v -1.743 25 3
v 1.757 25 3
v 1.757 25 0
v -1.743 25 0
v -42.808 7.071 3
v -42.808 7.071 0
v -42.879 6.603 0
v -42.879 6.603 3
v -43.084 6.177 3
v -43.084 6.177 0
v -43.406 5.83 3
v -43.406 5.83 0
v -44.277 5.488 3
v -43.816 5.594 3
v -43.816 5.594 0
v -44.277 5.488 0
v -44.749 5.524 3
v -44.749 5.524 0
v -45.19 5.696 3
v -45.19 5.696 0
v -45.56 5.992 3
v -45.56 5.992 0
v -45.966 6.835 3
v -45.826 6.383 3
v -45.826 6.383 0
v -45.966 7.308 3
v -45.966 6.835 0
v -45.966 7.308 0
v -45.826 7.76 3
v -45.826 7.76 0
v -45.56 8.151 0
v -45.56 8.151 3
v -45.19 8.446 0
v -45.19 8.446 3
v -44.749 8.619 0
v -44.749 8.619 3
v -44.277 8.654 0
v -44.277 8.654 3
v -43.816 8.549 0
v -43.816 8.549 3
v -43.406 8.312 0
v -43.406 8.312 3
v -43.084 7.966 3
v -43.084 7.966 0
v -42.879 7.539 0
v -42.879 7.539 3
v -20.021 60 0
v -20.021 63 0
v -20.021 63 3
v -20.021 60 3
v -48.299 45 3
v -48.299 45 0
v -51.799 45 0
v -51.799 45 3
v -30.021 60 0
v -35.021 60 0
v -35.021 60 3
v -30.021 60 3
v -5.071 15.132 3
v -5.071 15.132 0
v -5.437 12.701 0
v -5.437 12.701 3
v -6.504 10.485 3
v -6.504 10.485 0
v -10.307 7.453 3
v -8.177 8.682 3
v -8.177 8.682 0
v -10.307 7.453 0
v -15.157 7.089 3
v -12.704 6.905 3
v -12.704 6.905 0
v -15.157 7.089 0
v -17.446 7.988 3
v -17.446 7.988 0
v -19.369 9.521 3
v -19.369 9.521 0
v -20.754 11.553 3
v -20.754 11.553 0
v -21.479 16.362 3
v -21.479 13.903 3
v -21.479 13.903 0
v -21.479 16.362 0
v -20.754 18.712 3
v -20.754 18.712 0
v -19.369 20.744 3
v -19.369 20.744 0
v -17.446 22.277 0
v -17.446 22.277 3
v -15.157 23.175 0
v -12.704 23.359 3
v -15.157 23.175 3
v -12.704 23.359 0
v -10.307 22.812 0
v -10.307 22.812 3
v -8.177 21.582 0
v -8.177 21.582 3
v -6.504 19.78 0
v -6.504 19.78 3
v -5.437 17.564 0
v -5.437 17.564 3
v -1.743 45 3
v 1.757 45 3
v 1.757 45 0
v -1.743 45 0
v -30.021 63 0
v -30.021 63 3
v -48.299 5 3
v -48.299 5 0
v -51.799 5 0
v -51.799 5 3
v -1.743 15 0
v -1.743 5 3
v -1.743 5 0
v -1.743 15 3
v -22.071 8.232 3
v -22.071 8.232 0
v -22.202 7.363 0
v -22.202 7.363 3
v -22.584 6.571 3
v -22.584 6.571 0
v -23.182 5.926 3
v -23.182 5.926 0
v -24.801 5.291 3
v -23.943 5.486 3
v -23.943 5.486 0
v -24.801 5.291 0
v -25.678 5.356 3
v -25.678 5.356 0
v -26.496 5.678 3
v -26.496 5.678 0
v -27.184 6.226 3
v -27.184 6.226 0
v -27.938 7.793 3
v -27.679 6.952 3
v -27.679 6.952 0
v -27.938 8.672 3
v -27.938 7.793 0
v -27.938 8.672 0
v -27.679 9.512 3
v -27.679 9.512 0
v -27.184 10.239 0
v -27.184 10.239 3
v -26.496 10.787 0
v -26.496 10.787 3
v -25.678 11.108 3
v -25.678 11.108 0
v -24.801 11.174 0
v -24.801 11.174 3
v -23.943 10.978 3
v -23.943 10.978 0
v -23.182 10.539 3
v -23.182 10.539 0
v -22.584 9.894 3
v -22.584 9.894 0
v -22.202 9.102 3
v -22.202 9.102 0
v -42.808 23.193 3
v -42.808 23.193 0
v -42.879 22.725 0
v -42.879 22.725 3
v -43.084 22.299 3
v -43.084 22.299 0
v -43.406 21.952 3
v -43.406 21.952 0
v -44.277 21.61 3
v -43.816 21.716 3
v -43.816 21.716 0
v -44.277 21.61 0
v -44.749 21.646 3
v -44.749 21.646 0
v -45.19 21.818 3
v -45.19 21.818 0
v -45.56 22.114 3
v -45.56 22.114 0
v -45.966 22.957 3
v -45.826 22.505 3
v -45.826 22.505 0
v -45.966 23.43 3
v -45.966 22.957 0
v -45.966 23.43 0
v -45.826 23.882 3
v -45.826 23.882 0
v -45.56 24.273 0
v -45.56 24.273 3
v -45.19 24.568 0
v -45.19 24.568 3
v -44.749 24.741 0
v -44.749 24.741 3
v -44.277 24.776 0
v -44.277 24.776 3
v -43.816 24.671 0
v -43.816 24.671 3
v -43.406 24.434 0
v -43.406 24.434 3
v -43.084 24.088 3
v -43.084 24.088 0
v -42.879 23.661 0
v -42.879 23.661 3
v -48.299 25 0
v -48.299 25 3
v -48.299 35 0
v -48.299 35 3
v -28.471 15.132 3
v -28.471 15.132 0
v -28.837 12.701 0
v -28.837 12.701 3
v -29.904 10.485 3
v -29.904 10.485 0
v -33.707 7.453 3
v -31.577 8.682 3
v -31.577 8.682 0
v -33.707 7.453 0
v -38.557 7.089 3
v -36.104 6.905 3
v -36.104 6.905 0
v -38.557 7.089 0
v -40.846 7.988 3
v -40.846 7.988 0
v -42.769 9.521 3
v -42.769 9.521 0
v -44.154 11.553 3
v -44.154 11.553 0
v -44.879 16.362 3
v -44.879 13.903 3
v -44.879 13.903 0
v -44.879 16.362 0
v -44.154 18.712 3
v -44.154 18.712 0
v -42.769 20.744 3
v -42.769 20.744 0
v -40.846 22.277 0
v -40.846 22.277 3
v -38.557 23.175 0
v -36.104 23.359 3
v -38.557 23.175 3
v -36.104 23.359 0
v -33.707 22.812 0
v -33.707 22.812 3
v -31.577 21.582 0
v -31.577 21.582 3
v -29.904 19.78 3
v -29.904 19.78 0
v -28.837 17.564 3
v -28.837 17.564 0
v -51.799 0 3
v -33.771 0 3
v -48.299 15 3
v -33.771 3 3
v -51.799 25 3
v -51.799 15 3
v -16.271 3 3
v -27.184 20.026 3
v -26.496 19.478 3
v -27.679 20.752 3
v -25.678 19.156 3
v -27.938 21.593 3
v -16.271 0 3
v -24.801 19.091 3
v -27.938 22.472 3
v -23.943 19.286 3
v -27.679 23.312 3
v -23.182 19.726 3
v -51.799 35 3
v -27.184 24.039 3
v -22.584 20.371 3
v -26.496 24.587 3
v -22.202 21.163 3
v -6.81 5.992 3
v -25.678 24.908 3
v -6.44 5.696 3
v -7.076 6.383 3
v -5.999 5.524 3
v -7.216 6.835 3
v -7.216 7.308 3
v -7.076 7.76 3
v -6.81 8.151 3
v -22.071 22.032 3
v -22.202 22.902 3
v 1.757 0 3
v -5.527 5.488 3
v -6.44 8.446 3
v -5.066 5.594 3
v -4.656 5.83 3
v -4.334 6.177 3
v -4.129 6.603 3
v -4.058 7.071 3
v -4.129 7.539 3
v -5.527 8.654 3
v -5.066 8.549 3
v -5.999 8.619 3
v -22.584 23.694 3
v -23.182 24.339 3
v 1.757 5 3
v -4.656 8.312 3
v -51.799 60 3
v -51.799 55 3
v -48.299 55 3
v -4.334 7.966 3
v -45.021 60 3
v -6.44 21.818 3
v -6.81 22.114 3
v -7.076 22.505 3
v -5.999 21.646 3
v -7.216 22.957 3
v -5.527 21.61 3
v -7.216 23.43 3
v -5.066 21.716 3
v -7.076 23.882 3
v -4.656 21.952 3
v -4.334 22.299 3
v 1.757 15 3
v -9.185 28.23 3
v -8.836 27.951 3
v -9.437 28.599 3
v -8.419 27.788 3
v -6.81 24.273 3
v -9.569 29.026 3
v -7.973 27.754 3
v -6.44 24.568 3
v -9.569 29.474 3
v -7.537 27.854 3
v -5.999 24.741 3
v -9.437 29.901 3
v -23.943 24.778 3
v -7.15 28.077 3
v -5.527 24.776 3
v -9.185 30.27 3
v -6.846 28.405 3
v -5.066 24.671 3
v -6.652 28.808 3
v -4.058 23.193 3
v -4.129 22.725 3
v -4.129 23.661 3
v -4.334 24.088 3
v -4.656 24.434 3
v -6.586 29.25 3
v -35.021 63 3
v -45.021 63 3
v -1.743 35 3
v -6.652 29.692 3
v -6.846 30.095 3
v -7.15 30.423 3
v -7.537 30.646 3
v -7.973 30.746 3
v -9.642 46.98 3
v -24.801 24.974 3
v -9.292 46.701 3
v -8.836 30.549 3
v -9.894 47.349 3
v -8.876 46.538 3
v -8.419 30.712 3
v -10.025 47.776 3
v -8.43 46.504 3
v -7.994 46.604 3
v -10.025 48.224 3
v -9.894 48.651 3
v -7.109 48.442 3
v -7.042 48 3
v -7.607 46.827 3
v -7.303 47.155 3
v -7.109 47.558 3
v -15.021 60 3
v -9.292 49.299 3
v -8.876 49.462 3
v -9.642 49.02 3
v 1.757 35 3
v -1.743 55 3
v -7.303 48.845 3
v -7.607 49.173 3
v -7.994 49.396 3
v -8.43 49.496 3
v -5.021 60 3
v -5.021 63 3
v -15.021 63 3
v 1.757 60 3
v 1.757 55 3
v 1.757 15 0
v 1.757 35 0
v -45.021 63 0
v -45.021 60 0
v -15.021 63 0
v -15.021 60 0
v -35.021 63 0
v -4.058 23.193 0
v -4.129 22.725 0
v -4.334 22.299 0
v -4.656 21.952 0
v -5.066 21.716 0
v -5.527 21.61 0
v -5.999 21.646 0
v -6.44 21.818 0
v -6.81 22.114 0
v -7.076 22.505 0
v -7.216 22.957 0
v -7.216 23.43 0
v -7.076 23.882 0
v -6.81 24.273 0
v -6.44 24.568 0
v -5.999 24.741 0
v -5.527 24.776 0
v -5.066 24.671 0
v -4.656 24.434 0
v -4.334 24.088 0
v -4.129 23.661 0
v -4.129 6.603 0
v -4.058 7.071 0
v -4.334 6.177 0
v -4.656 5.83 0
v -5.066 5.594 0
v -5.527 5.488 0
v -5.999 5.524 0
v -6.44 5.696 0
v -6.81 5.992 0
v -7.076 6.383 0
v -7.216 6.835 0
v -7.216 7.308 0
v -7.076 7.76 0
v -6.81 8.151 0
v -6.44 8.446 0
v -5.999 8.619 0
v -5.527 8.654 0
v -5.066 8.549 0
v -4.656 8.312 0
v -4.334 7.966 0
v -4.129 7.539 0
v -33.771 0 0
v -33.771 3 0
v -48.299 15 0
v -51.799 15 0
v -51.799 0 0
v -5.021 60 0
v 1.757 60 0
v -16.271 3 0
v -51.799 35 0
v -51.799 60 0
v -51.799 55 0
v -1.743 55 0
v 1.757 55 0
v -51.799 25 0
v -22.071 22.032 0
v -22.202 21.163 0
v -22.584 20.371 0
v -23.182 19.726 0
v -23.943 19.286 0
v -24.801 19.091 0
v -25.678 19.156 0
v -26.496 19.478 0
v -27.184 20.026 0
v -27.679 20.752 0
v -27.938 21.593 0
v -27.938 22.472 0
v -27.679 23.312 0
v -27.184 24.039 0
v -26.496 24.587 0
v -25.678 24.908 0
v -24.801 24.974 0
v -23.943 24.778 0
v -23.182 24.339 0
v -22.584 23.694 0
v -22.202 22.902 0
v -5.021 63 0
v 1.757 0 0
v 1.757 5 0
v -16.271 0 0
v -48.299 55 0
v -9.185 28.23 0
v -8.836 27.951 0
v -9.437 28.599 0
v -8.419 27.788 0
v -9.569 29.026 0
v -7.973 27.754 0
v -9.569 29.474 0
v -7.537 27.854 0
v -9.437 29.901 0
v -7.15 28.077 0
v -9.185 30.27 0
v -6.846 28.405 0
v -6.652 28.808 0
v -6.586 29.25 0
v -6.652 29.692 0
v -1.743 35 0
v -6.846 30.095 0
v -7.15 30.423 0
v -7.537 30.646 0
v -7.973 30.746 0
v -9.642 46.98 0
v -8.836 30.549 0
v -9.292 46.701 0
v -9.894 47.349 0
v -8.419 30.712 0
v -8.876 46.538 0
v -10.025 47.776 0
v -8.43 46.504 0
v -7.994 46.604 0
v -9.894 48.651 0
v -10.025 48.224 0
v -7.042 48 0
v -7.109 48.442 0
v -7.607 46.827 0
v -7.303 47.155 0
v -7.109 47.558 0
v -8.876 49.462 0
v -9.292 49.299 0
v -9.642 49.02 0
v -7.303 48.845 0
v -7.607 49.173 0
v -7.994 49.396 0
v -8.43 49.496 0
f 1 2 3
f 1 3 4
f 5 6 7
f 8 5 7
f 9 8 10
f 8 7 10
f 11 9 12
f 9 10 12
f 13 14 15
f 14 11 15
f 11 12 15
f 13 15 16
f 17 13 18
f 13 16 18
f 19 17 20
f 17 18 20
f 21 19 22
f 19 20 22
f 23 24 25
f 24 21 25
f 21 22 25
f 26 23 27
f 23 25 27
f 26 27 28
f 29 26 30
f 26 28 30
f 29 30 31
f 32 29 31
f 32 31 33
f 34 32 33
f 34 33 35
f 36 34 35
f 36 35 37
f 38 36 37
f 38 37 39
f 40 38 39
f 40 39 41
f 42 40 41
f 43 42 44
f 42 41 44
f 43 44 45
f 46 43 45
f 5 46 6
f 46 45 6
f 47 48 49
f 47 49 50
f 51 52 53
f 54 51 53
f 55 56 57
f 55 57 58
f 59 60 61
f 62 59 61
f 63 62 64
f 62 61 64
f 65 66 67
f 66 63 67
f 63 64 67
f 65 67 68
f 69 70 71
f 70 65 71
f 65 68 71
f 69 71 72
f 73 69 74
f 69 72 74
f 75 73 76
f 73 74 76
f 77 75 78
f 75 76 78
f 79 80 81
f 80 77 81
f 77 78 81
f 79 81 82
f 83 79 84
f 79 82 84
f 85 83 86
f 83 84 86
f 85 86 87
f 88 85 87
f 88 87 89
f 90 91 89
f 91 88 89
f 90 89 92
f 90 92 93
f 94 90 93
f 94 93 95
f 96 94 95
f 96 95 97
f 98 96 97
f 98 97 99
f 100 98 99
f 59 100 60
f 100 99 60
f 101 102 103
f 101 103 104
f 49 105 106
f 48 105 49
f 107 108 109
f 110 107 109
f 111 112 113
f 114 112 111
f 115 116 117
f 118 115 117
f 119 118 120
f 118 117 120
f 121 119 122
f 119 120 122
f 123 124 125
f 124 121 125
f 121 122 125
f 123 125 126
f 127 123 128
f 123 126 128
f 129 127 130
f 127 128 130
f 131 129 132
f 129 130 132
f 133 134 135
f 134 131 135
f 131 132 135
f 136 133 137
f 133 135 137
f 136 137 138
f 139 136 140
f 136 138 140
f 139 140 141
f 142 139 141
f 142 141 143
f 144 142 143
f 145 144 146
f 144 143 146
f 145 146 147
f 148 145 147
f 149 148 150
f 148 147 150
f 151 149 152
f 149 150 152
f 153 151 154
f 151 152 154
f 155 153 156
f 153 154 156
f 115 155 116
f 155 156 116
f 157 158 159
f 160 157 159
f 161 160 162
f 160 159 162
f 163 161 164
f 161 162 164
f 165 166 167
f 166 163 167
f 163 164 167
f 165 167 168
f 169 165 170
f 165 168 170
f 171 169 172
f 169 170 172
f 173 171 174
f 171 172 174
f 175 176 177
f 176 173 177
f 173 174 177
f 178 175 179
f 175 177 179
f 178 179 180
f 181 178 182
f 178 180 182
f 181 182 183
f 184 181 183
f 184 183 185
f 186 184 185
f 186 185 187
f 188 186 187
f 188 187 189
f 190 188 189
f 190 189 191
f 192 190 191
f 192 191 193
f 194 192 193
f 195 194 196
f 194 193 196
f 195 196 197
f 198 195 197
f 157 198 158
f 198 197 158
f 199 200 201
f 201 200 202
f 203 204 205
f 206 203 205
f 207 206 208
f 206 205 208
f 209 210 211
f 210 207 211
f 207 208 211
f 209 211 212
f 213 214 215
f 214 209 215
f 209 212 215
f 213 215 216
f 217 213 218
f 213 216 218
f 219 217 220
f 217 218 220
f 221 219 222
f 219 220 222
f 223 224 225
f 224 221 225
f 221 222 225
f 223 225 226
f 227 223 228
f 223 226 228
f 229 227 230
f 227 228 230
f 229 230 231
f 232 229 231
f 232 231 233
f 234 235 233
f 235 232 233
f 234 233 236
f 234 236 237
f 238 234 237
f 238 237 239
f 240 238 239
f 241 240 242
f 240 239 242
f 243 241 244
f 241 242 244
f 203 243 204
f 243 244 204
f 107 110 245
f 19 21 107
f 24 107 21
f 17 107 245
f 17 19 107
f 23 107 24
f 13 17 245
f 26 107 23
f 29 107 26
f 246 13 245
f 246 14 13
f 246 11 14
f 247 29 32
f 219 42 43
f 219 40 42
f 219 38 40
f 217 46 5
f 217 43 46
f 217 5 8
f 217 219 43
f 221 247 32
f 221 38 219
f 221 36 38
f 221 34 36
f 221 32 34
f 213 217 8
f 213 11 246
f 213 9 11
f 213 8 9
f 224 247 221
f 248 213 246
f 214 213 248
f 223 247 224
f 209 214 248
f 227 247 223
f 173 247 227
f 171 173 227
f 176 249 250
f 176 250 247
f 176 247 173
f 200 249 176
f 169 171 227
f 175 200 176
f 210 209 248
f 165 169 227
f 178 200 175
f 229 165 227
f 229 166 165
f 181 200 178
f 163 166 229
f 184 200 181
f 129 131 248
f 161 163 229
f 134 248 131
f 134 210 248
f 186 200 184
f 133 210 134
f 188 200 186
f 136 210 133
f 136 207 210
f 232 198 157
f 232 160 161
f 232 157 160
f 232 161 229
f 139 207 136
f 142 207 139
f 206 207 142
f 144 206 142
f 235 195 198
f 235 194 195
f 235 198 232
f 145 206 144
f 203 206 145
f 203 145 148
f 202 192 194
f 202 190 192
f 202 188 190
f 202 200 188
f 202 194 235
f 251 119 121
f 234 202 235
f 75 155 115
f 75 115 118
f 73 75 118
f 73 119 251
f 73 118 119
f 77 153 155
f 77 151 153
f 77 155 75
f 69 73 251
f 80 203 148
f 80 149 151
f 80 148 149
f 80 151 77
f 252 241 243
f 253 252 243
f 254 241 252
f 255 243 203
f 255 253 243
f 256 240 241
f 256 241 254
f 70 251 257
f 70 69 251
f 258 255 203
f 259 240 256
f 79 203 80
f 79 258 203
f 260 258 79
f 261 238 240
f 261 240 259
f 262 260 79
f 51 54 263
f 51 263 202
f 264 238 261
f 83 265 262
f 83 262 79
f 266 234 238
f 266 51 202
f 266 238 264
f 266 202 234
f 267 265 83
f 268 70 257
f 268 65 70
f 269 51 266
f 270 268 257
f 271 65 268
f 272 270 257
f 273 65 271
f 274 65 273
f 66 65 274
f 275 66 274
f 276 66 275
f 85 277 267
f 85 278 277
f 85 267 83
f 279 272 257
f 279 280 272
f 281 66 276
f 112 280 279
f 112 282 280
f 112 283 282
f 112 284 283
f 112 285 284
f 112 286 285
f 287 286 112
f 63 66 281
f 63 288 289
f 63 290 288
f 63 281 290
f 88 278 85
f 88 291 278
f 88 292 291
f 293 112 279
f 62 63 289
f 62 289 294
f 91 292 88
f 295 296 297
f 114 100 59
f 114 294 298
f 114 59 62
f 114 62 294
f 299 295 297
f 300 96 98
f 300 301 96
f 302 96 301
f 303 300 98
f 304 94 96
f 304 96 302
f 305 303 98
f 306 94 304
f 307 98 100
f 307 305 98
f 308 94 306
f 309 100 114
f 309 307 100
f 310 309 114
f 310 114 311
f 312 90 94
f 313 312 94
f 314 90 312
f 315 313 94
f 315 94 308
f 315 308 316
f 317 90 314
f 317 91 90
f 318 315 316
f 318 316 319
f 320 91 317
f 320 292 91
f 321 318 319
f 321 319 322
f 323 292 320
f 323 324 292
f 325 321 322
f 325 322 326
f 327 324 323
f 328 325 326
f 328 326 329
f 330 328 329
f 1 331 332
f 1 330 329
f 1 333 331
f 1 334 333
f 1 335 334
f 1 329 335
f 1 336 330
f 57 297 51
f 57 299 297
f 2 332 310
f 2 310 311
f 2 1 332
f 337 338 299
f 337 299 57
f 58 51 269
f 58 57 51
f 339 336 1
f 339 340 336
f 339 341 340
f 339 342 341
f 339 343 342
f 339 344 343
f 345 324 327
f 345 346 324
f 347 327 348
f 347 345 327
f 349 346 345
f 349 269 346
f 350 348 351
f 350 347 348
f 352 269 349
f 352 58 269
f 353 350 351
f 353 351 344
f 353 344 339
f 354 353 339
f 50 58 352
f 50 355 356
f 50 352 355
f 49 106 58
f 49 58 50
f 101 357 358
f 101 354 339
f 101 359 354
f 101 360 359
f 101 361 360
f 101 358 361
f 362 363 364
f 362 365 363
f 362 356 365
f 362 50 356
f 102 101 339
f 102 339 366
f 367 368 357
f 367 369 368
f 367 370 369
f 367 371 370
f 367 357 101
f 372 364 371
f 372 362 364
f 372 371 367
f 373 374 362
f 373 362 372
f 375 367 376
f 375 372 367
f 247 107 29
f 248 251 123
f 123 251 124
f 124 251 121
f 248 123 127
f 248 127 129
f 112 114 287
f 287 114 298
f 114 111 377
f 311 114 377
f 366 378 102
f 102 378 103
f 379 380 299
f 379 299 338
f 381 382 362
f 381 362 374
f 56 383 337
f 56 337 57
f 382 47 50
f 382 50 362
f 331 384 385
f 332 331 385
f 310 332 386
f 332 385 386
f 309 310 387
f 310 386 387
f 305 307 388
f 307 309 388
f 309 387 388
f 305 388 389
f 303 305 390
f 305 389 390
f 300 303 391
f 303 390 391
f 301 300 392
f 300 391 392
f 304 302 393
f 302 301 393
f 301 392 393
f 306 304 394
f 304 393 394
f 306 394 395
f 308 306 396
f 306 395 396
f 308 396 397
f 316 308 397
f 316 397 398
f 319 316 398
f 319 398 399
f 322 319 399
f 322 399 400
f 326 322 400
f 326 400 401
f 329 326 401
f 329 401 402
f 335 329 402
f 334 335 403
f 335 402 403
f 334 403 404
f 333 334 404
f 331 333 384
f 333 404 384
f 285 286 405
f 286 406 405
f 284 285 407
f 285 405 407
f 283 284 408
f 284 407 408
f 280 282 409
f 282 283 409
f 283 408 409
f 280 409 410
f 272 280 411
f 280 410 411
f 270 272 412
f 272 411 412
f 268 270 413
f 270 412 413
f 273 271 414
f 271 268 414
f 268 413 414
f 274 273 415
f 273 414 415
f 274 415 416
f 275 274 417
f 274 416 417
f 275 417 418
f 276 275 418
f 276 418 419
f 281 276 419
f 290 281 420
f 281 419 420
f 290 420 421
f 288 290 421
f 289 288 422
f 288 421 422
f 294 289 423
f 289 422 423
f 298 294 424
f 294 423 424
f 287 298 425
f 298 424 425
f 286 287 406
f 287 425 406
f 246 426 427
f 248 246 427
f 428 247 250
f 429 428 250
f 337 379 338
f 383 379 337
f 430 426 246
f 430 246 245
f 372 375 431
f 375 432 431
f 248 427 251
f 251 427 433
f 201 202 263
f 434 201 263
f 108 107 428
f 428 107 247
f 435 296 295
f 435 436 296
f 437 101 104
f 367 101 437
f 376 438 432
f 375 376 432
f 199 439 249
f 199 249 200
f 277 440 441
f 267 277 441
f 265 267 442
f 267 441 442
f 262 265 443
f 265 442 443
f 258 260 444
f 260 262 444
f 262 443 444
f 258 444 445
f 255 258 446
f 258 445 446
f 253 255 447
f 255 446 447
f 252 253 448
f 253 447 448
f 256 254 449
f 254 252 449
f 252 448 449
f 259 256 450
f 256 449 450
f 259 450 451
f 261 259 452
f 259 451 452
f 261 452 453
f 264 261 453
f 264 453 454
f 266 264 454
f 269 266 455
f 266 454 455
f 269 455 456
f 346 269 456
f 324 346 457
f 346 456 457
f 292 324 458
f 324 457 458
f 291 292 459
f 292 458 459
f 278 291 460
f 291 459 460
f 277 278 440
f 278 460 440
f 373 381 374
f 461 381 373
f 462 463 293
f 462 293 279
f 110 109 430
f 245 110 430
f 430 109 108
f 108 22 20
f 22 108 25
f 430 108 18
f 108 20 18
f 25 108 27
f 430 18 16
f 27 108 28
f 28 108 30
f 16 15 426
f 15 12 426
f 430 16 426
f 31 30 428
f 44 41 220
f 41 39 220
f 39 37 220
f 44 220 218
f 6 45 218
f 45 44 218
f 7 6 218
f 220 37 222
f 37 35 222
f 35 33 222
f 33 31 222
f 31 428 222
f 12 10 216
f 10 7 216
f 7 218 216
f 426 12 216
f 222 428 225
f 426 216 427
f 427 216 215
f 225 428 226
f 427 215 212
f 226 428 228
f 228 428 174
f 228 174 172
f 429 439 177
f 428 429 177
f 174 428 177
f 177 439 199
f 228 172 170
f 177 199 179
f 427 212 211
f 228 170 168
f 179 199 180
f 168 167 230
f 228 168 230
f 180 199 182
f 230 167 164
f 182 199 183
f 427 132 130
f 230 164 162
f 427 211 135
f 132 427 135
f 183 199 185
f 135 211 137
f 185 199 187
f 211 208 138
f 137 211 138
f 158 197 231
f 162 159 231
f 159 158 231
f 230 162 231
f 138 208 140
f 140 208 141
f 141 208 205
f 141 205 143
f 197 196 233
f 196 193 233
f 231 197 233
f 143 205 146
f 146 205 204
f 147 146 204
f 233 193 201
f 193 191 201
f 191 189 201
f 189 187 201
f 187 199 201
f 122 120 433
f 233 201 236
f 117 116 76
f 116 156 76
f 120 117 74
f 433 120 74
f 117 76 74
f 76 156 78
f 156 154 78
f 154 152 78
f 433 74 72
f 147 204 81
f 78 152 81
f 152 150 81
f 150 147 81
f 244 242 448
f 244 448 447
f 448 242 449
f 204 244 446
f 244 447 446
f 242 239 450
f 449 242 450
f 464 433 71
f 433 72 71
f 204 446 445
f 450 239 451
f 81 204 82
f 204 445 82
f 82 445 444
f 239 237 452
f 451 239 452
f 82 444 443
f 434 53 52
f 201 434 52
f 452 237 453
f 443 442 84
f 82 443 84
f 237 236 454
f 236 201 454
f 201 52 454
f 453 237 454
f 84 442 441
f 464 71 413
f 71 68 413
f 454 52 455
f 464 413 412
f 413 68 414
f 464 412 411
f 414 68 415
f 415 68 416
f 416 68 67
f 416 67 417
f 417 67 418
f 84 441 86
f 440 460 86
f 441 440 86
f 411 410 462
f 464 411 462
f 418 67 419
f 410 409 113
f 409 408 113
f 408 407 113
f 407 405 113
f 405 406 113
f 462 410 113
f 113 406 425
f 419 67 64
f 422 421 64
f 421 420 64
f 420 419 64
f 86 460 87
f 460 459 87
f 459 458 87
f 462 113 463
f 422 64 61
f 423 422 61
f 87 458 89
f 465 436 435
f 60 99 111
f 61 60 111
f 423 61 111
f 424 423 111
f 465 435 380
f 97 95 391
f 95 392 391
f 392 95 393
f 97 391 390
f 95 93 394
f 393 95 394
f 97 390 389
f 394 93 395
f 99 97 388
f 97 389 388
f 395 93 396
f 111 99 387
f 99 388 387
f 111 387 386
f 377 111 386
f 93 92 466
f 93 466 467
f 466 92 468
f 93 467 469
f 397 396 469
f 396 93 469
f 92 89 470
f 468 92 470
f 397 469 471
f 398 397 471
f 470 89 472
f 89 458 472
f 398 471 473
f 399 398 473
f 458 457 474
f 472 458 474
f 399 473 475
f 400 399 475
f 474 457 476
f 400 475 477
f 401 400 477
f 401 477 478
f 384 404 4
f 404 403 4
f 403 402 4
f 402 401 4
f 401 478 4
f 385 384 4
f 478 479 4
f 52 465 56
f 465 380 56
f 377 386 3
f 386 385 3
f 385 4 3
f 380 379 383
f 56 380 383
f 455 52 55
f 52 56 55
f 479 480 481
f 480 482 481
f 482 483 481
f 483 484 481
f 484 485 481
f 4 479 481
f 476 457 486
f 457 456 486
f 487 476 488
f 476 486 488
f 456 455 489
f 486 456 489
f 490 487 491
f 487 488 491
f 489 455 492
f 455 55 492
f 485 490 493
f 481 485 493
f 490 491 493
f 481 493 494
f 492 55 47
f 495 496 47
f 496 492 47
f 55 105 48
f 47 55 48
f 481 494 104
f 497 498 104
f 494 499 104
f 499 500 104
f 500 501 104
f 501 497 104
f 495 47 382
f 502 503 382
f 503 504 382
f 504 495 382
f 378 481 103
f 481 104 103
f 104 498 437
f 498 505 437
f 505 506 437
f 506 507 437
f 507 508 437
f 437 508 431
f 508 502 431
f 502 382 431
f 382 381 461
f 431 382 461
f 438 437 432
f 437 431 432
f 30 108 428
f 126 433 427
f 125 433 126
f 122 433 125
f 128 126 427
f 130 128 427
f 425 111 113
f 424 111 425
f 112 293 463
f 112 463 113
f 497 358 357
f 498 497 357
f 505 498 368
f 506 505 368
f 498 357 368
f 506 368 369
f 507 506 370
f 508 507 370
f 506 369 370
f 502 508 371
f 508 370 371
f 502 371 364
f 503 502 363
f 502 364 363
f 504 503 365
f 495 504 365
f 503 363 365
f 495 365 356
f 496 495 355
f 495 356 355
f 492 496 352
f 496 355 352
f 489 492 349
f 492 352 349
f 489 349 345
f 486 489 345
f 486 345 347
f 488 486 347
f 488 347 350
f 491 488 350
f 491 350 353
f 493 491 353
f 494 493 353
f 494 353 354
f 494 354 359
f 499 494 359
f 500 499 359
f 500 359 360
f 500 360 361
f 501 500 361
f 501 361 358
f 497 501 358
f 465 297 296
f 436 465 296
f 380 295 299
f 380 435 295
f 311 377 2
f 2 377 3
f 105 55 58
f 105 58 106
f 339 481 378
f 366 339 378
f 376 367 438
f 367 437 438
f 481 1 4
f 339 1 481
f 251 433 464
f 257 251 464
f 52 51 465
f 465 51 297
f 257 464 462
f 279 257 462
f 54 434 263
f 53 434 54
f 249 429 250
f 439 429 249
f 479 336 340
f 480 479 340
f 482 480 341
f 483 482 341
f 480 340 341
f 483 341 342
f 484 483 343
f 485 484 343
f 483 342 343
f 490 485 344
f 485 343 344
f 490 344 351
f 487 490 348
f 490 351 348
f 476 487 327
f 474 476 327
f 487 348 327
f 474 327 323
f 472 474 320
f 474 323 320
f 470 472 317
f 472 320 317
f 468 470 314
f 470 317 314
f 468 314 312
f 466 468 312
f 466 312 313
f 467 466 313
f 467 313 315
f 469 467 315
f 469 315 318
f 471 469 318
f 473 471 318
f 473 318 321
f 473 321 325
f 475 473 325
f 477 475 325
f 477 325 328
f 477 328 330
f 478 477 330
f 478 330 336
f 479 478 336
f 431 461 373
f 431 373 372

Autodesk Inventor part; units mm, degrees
ref_plane "YZ Plane" through (0, 0, 0) normal (1, 0, 0) x (0, 1, 0)
ref_plane "XZ Plane" through (0, 0, 0) normal (0, 1, 0) x (-1, 0, 0)
ref_plane "XY Plane" through (0, 0, 0) normal (0, 0, 1) x (1, 0, 0)
sketch "Sketch1" plane through (0, 0, 0) normal (0, 0, 1) x (1, 0, 0)
  line L0 (-16.2709, 3) -> (-16.2709, 0)
  line L1 (-33.7709, 3) -> (-16.2709, 3)
  line L2 (-33.7709, 0) -> (-33.7709, 3)
  line L3 (-33.7709, 0) -> (-48.7992, 0)
  line L4 (-30.0209, 63) -> (-20.0209, 63)
  line L5 (-20.0209, 63) -> (-20.0209, 60)
  line L6 (-30.0209, 60) -> (-30.0209, 63)
  line L7 (-30.0209, 63) -> (-20.0209, 60) construction
  line L8 (-20.0209, 63) -> (-30.0209, 60) construction
  line L9 (-25.4776, 30) -> (-35.4566, 30) construction
  line L10 (-25.0209, 30) -> (-25.0209, 38) construction
  line L11 (-45.0209, 63) -> (-35.0209, 63)
  line L12 (-35.0209, 63) -> (-35.0209, 60)
  line L13 (-45.0209, 60) -> (-45.0209, 63)
  line L14 (-45.0209, 63) -> (-35.0209, 60) construction
  line L15 (-35.0209, 63) -> (-45.0209, 60) construction
  line L16 (-15.0209, 63) -> (-5.0209, 63)
  line L17 (-5.0209, 63) -> (-5.0209, 60)
  line L18 (-15.0209, 60) -> (-15.0209, 63)
  line L19 (-15.0209, 63) -> (-5.0209, 60) construction
  line L20 (-5.0209, 63) -> (-15.0209, 60) construction
  line L21 (-30.0209, 63) -> (-20.0209, 63)
  line L22 (-20.0209, 63) -> (-20.0209, 60)
  line L23 (-30.0209, 60) -> (-30.0209, 63)
  line L24 (-30.0209, 63) -> (-20.0209, 60) construction
  line L25 (-20.0209, 63) -> (-30.0209, 60) construction
  line L26 (-48.7992, 60) -> (-45.0209, 60)
  line L27 (-35.0209, 60) -> (-30.0209, 60)
  line L28 (-20.0209, 60) -> (-15.0209, 60)
  line L29 (-48.7992, 15) -> (-51.799, 15)
  line L30 (-51.799, 15) -> (-51.799, 25)
  line L31 (-51.799, 25) -> (-48.7992, 25)
  line L32 (-48.7992, 35) -> (-51.799, 35)
  line L33 (-51.799, 35) -> (-51.799, 45)
  line L34 (-48.7992, 45) -> (-51.799, 45)
  line L35 (-48.7992, 55) -> (-51.7992, 55)
  line L36 (-48.7992, 55) -> (-45.7992, 55) construction
  line L37 (-51.7992, 55) -> (-51.7992, 60)
  line L38 (-51.7992, 60) -> (-48.7992, 60)
  line L39 (-48.7992, 55) -> (-48.7992, 45)
  line L40 (-48.7992, 35) -> (-48.7992, 25)
  line L41 (-48.7992, 15) -> (-48.7992, 5)
  line L42 (-48.7992, 5) -> (-51.7992, 5)
  line L43 (-51.7992, 5) -> (-51.7992, 0)
  line L44 (-51.7992, 0) -> (-48.7992, 0)
  line L45 (-16.2709, 0) -> (-1.2426, 0)
  line L46 (-1.2426, 60) -> (-5.0209, 60)
  line L47 (-1.2426, 15) -> (1.7572, 15)
  line L48 (1.7572, 15) -> (1.7572, 25)
  line L49 (1.7572, 25) -> (-1.2426, 25)
  line L50 (-1.2426, 35) -> (1.7572, 35)
  line L51 (1.7572, 35) -> (1.7572, 45)
  line L52 (-1.2426, 45) -> (1.7572, 45)
  line L53 (-1.2426, 55) -> (1.7574, 55)
  line L54 (1.7574, 55) -> (1.7574, 60)
  line L55 (1.7574, 60) -> (-1.2426, 60)
  line L56 (-1.2426, 55) -> (-1.2426, 45)
  line L57 (-1.2426, 35) -> (-1.2426, 25)
  line L58 (-1.2426, 15) -> (-1.2426, 5)
  line L59 (-1.2426, 5) -> (1.7574, 5)
  line L60 (1.7574, 5) -> (1.7574, 0)
  line L61 (1.7574, 0) -> (-1.2426, 0)
  circle A0 centre (-44.3959, 23.1933) radius 1.5875
  circle A1 centre (-44.3959, 7.0713) radius 1.5875
  circle A2 centre (-36.7209, 15.1323) radius 8.25
  circle A3 centre (-25.0211, 22.0323) radius 2.95
  circle A4 centre (-25.0211, 8.2323) radius 2.95
  circle A5 centre (-13.3209, 15.1323) radius 8.25
  circle A6 centre (-5.6459, 7.0713) radius 1.5875
  circle A7 centre (-5.6459, 23.1933) radius 1.5875
  circle A8 centre (-41.9566, 29.25) radius 1.5
  circle A9 centre (-41.5, 48) radius 1.5
  line L62 (-5.6459, 7.0713) -> (-44.3959, 23.1933) construction
  line L63 (-44.3959, 23.1933) -> (-5.6459, 23.1933) construction
  line L64 (-5.6459, 23.1933) -> (-44.3959, 7.0713) construction
  point P0 (0, 0)
  point P1 (-25.0209, 61.5)
  point P2 (-40.0209, 61.5)
  point P3 (-10.0209, 61.5)
  point P4 (-25.0209, 61.5)
  point P5 (-48.7992, 30)
  point P6 (-1.2426, 30)
  point P7 (-25.4776, 15.3162)
  point P8 (-25.4776, 15.3162)
  point P9 (-25.4776, 15.3162)
  point P10 (-25.4776, 15.3162)
  point P11 (-25.0209, 3)
  point P12 (-25.0209, 15.1323)
  dimension "d0" = 10
  dimension "d1" = 3
  dimension "d4" = 15
  dimension "d7" = 15
  dimension "d13" = 3
  dimension "d14" = 180
  dimension "d15" = 3
  dimension "d17" = 7.675
  dimension "d18" = 7.675
  dimension "d23" = 2.9998
  dimension "d30" = 11.7002
  dimension "d31" = 11.6998
  dimension "d32" = 7.675
  dimension "d33" = 7.675
  dimension "d34" = 11.6998
  dimension "d35" = 11.7002
  dimension "d45" = 8.061
  dimension "d46" = 8.061
extrude "Extrusion2" add sketch "Sketch1" along normal blind 3
sketch "Sketch2" plane through (0, 0, 3) normal (0, 0, 1) x (1, 0, 0)
  line L0 (-1.2426, 5) -> (-1.2426, 15) projected
  line L1 (-1.2426, 25) -> (-1.2426, 35) projected
  line L2 (-1.2426, 45) -> (-1.2426, 55) projected
  line L3 (-48.7992, 55) -> (-48.7992, 45) projected
  line L4 (-48.7992, 35) -> (-48.7992, 25) projected
  line L5 (-48.7992, 15) -> (-48.7992, 5) projected
  line L6 (-1.2426, 5) -> (-1.7426, 5)
  line L7 (-1.7426, 5) -> (-1.7426, 15)
  line L8 (-1.7426, 15) -> (-1.2426, 15)
  line L9 (-1.2426, 25) -> (-1.7426, 25)
  line L10 (-1.7426, 25) -> (-1.7426, 35)
  line L11 (-1.7426, 35) -> (-1.2426, 35)
  line L12 (-1.2426, 45) -> (-1.7426, 45)
  line L13 (-1.7426, 45) -> (-1.7426, 55)
  line L14 (-1.7426, 55) -> (-1.2426, 55)
  line L15 (-48.7992, 5) -> (-48.2992, 5)
  line L16 (-48.2992, 5) -> (-48.2992, 15)
  line L17 (-48.2992, 15) -> (-48.7992, 15)
  line L18 (-48.7992, 25) -> (-48.2992, 25)
  line L19 (-48.2992, 25) -> (-48.2992, 35)
  line L20 (-48.2992, 35) -> (-48.7992, 35)
  line L21 (-48.7992, 45) -> (-48.2992, 45)
  line L22 (-48.7992, 45) -> (-51.799, 45) projected
  line L23 (-48.2992, 45) -> (-48.2992, 55)
  line L24 (-48.2992, 55) -> (-48.7992, 55)
  point P0 (0, 0)
  dimension "d24" = 0.5
  dimension "d25" = 0.5
  dimension "d28" = 0.5
  dimension "d29" = 0.5
extrude "Extrusion3" cut sketch "Sketch2" against normal through all
sketch "Sketch3" plane through (0, 0, 3) normal (0, 0, 1) x (1, 0, 0)
  line L0 (-48.2992, 25) -> (-51.799, 25) projected
  line L1 (-51.799, 25) -> (-51.799, 15) projected
  line L2 (-51.799, 15) -> (-48.2992, 15) projected
  line L3 (-48.2992, 15) -> (-48.2992, 5) projected
  line L4 (-48.2992, 5) -> (-51.7992, 5) projected
  line L5 (-51.7992, 5) -> (-51.7992, 0) projected
  line L6 (-51.7992, 0) -> (-33.7709, 0) projected
  line L7 (-33.7709, 0) -> (-33.7709, 3) projected
  line L8 (-33.7709, 3) -> (-16.2709, 3) projected
  line L9 (-16.2709, 3) -> (-16.2709, 0) projected
  line L10 (-16.2709, 0) -> (1.7574, 0) projected
  line L11 (1.7574, 0) -> (1.7574, 5) projected
  line L12 (1.7574, 5) -> (-1.7426, 5) projected
  line L13 (-1.7426, 5) -> (-1.7426, 15) projected
  line L14 (-1.7426, 15) -> (1.7572, 15) projected
  line L15 (1.7572, 15) -> (1.7572, 25) projected
  line L16 (1.7572, 25) -> (-1.7426, 25) projected
  line L17 (-1.7426, 25) -> (-1.7426, 35) projected
  line L18 (-1.7426, 35) -> (1.7572, 35) projected
  line L19 (1.7572, 35) -> (1.7572, 45) projected
  line L20 (1.7572, 45) -> (-1.7426, 45) projected
  line L21 (-1.7426, 45) -> (-1.7426, 55) projected
  line L22 (-1.7426, 55) -> (1.7574, 55) projected
  line L23 (1.7574, 55) -> (1.7574, 60) projected
  line L24 (1.7574, 60) -> (-5.0209, 60) projected
  line L25 (-5.0209, 60) -> (-5.0209, 63) projected
  line L26 (-5.0209, 63) -> (-15.0209, 63) projected
  line L27 (-15.0209, 63) -> (-15.0209, 60) projected
  line L28 (-15.0209, 60) -> (-20.0209, 60) projected
  line L29 (-20.0209, 60) -> (-20.0209, 63) projected
  line L30 (-20.0209, 63) -> (-30.0209, 63) projected
  line L31 (-30.0209, 63) -> (-30.0209, 60) projected
  line L32 (-30.0209, 60) -> (-35.0209, 60) projected
  line L33 (-35.0209, 60) -> (-35.0209, 63) projected
  line L34 (-35.0209, 63) -> (-45.0209, 63) projected
  line L35 (-45.0209, 63) -> (-45.0209, 60) projected
  line L36 (-45.0209, 60) -> (-51.7992, 60) projected
  line L37 (-51.7992, 60) -> (-51.7992, 55) projected
  line L38 (-51.7992, 55) -> (-48.2992, 55) projected
  line L39 (-48.2992, 55) -> (-48.2992, 45) projected
  line L40 (-48.2992, 45) -> (-51.799, 45) projected
  line L41 (-51.799, 45) -> (-51.799, 35) projected
  line L42 (-51.799, 35) -> (-48.2992, 35) projected
  line L43 (-48.2992, 35) -> (-48.2992, 25) projected
  circle A0 centre (-13.3209, 15.1323) radius 8.25 projected
  circle A1 centre (-36.7209, 15.1323) radius 8.25 projected
  circle A2 centre (-25.0211, 8.2323) radius 2.95 projected
  circle A3 centre (-25.0211, 22.0323) radius 2.95 projected
  circle A4 centre (-5.6459, 7.0713) radius 1.5875 projected
  circle A5 centre (-5.6459, 23.1933) radius 1.5875 projected
  circle A6 centre (-44.3959, 7.0713) radius 1.5875 projected
  circle A7 centre (-44.3959, 23.1933) radius 1.5875 projected
  circle A8 centre (-41.9566, 29.25) radius 1.5 projected
  circle A9 centre (-41.5, 48) radius 1.5 projected
  line L44 (-25.0211, 33) -> (-25.0211, 49.5)
  circle A10 centre (-8.0855, 29.25) radius 1.5
  circle A11 centre (-8.5422, 48) radius 1.5
  point P0 (0, 0)
extrude "Extrusion4" cut sketch "Sketch3" against normal up to next contours A10 | A11
extrude "Extrusion5" add sketch "Sketch3" against normal blind 3 contours A8 | A9
equation "\"d46\" = d45"
equation "\"d25\" = d24"
equation "\"d28\" = d24"
equation "\"d29\" = d24"
properties part number "srf diag kiri"
